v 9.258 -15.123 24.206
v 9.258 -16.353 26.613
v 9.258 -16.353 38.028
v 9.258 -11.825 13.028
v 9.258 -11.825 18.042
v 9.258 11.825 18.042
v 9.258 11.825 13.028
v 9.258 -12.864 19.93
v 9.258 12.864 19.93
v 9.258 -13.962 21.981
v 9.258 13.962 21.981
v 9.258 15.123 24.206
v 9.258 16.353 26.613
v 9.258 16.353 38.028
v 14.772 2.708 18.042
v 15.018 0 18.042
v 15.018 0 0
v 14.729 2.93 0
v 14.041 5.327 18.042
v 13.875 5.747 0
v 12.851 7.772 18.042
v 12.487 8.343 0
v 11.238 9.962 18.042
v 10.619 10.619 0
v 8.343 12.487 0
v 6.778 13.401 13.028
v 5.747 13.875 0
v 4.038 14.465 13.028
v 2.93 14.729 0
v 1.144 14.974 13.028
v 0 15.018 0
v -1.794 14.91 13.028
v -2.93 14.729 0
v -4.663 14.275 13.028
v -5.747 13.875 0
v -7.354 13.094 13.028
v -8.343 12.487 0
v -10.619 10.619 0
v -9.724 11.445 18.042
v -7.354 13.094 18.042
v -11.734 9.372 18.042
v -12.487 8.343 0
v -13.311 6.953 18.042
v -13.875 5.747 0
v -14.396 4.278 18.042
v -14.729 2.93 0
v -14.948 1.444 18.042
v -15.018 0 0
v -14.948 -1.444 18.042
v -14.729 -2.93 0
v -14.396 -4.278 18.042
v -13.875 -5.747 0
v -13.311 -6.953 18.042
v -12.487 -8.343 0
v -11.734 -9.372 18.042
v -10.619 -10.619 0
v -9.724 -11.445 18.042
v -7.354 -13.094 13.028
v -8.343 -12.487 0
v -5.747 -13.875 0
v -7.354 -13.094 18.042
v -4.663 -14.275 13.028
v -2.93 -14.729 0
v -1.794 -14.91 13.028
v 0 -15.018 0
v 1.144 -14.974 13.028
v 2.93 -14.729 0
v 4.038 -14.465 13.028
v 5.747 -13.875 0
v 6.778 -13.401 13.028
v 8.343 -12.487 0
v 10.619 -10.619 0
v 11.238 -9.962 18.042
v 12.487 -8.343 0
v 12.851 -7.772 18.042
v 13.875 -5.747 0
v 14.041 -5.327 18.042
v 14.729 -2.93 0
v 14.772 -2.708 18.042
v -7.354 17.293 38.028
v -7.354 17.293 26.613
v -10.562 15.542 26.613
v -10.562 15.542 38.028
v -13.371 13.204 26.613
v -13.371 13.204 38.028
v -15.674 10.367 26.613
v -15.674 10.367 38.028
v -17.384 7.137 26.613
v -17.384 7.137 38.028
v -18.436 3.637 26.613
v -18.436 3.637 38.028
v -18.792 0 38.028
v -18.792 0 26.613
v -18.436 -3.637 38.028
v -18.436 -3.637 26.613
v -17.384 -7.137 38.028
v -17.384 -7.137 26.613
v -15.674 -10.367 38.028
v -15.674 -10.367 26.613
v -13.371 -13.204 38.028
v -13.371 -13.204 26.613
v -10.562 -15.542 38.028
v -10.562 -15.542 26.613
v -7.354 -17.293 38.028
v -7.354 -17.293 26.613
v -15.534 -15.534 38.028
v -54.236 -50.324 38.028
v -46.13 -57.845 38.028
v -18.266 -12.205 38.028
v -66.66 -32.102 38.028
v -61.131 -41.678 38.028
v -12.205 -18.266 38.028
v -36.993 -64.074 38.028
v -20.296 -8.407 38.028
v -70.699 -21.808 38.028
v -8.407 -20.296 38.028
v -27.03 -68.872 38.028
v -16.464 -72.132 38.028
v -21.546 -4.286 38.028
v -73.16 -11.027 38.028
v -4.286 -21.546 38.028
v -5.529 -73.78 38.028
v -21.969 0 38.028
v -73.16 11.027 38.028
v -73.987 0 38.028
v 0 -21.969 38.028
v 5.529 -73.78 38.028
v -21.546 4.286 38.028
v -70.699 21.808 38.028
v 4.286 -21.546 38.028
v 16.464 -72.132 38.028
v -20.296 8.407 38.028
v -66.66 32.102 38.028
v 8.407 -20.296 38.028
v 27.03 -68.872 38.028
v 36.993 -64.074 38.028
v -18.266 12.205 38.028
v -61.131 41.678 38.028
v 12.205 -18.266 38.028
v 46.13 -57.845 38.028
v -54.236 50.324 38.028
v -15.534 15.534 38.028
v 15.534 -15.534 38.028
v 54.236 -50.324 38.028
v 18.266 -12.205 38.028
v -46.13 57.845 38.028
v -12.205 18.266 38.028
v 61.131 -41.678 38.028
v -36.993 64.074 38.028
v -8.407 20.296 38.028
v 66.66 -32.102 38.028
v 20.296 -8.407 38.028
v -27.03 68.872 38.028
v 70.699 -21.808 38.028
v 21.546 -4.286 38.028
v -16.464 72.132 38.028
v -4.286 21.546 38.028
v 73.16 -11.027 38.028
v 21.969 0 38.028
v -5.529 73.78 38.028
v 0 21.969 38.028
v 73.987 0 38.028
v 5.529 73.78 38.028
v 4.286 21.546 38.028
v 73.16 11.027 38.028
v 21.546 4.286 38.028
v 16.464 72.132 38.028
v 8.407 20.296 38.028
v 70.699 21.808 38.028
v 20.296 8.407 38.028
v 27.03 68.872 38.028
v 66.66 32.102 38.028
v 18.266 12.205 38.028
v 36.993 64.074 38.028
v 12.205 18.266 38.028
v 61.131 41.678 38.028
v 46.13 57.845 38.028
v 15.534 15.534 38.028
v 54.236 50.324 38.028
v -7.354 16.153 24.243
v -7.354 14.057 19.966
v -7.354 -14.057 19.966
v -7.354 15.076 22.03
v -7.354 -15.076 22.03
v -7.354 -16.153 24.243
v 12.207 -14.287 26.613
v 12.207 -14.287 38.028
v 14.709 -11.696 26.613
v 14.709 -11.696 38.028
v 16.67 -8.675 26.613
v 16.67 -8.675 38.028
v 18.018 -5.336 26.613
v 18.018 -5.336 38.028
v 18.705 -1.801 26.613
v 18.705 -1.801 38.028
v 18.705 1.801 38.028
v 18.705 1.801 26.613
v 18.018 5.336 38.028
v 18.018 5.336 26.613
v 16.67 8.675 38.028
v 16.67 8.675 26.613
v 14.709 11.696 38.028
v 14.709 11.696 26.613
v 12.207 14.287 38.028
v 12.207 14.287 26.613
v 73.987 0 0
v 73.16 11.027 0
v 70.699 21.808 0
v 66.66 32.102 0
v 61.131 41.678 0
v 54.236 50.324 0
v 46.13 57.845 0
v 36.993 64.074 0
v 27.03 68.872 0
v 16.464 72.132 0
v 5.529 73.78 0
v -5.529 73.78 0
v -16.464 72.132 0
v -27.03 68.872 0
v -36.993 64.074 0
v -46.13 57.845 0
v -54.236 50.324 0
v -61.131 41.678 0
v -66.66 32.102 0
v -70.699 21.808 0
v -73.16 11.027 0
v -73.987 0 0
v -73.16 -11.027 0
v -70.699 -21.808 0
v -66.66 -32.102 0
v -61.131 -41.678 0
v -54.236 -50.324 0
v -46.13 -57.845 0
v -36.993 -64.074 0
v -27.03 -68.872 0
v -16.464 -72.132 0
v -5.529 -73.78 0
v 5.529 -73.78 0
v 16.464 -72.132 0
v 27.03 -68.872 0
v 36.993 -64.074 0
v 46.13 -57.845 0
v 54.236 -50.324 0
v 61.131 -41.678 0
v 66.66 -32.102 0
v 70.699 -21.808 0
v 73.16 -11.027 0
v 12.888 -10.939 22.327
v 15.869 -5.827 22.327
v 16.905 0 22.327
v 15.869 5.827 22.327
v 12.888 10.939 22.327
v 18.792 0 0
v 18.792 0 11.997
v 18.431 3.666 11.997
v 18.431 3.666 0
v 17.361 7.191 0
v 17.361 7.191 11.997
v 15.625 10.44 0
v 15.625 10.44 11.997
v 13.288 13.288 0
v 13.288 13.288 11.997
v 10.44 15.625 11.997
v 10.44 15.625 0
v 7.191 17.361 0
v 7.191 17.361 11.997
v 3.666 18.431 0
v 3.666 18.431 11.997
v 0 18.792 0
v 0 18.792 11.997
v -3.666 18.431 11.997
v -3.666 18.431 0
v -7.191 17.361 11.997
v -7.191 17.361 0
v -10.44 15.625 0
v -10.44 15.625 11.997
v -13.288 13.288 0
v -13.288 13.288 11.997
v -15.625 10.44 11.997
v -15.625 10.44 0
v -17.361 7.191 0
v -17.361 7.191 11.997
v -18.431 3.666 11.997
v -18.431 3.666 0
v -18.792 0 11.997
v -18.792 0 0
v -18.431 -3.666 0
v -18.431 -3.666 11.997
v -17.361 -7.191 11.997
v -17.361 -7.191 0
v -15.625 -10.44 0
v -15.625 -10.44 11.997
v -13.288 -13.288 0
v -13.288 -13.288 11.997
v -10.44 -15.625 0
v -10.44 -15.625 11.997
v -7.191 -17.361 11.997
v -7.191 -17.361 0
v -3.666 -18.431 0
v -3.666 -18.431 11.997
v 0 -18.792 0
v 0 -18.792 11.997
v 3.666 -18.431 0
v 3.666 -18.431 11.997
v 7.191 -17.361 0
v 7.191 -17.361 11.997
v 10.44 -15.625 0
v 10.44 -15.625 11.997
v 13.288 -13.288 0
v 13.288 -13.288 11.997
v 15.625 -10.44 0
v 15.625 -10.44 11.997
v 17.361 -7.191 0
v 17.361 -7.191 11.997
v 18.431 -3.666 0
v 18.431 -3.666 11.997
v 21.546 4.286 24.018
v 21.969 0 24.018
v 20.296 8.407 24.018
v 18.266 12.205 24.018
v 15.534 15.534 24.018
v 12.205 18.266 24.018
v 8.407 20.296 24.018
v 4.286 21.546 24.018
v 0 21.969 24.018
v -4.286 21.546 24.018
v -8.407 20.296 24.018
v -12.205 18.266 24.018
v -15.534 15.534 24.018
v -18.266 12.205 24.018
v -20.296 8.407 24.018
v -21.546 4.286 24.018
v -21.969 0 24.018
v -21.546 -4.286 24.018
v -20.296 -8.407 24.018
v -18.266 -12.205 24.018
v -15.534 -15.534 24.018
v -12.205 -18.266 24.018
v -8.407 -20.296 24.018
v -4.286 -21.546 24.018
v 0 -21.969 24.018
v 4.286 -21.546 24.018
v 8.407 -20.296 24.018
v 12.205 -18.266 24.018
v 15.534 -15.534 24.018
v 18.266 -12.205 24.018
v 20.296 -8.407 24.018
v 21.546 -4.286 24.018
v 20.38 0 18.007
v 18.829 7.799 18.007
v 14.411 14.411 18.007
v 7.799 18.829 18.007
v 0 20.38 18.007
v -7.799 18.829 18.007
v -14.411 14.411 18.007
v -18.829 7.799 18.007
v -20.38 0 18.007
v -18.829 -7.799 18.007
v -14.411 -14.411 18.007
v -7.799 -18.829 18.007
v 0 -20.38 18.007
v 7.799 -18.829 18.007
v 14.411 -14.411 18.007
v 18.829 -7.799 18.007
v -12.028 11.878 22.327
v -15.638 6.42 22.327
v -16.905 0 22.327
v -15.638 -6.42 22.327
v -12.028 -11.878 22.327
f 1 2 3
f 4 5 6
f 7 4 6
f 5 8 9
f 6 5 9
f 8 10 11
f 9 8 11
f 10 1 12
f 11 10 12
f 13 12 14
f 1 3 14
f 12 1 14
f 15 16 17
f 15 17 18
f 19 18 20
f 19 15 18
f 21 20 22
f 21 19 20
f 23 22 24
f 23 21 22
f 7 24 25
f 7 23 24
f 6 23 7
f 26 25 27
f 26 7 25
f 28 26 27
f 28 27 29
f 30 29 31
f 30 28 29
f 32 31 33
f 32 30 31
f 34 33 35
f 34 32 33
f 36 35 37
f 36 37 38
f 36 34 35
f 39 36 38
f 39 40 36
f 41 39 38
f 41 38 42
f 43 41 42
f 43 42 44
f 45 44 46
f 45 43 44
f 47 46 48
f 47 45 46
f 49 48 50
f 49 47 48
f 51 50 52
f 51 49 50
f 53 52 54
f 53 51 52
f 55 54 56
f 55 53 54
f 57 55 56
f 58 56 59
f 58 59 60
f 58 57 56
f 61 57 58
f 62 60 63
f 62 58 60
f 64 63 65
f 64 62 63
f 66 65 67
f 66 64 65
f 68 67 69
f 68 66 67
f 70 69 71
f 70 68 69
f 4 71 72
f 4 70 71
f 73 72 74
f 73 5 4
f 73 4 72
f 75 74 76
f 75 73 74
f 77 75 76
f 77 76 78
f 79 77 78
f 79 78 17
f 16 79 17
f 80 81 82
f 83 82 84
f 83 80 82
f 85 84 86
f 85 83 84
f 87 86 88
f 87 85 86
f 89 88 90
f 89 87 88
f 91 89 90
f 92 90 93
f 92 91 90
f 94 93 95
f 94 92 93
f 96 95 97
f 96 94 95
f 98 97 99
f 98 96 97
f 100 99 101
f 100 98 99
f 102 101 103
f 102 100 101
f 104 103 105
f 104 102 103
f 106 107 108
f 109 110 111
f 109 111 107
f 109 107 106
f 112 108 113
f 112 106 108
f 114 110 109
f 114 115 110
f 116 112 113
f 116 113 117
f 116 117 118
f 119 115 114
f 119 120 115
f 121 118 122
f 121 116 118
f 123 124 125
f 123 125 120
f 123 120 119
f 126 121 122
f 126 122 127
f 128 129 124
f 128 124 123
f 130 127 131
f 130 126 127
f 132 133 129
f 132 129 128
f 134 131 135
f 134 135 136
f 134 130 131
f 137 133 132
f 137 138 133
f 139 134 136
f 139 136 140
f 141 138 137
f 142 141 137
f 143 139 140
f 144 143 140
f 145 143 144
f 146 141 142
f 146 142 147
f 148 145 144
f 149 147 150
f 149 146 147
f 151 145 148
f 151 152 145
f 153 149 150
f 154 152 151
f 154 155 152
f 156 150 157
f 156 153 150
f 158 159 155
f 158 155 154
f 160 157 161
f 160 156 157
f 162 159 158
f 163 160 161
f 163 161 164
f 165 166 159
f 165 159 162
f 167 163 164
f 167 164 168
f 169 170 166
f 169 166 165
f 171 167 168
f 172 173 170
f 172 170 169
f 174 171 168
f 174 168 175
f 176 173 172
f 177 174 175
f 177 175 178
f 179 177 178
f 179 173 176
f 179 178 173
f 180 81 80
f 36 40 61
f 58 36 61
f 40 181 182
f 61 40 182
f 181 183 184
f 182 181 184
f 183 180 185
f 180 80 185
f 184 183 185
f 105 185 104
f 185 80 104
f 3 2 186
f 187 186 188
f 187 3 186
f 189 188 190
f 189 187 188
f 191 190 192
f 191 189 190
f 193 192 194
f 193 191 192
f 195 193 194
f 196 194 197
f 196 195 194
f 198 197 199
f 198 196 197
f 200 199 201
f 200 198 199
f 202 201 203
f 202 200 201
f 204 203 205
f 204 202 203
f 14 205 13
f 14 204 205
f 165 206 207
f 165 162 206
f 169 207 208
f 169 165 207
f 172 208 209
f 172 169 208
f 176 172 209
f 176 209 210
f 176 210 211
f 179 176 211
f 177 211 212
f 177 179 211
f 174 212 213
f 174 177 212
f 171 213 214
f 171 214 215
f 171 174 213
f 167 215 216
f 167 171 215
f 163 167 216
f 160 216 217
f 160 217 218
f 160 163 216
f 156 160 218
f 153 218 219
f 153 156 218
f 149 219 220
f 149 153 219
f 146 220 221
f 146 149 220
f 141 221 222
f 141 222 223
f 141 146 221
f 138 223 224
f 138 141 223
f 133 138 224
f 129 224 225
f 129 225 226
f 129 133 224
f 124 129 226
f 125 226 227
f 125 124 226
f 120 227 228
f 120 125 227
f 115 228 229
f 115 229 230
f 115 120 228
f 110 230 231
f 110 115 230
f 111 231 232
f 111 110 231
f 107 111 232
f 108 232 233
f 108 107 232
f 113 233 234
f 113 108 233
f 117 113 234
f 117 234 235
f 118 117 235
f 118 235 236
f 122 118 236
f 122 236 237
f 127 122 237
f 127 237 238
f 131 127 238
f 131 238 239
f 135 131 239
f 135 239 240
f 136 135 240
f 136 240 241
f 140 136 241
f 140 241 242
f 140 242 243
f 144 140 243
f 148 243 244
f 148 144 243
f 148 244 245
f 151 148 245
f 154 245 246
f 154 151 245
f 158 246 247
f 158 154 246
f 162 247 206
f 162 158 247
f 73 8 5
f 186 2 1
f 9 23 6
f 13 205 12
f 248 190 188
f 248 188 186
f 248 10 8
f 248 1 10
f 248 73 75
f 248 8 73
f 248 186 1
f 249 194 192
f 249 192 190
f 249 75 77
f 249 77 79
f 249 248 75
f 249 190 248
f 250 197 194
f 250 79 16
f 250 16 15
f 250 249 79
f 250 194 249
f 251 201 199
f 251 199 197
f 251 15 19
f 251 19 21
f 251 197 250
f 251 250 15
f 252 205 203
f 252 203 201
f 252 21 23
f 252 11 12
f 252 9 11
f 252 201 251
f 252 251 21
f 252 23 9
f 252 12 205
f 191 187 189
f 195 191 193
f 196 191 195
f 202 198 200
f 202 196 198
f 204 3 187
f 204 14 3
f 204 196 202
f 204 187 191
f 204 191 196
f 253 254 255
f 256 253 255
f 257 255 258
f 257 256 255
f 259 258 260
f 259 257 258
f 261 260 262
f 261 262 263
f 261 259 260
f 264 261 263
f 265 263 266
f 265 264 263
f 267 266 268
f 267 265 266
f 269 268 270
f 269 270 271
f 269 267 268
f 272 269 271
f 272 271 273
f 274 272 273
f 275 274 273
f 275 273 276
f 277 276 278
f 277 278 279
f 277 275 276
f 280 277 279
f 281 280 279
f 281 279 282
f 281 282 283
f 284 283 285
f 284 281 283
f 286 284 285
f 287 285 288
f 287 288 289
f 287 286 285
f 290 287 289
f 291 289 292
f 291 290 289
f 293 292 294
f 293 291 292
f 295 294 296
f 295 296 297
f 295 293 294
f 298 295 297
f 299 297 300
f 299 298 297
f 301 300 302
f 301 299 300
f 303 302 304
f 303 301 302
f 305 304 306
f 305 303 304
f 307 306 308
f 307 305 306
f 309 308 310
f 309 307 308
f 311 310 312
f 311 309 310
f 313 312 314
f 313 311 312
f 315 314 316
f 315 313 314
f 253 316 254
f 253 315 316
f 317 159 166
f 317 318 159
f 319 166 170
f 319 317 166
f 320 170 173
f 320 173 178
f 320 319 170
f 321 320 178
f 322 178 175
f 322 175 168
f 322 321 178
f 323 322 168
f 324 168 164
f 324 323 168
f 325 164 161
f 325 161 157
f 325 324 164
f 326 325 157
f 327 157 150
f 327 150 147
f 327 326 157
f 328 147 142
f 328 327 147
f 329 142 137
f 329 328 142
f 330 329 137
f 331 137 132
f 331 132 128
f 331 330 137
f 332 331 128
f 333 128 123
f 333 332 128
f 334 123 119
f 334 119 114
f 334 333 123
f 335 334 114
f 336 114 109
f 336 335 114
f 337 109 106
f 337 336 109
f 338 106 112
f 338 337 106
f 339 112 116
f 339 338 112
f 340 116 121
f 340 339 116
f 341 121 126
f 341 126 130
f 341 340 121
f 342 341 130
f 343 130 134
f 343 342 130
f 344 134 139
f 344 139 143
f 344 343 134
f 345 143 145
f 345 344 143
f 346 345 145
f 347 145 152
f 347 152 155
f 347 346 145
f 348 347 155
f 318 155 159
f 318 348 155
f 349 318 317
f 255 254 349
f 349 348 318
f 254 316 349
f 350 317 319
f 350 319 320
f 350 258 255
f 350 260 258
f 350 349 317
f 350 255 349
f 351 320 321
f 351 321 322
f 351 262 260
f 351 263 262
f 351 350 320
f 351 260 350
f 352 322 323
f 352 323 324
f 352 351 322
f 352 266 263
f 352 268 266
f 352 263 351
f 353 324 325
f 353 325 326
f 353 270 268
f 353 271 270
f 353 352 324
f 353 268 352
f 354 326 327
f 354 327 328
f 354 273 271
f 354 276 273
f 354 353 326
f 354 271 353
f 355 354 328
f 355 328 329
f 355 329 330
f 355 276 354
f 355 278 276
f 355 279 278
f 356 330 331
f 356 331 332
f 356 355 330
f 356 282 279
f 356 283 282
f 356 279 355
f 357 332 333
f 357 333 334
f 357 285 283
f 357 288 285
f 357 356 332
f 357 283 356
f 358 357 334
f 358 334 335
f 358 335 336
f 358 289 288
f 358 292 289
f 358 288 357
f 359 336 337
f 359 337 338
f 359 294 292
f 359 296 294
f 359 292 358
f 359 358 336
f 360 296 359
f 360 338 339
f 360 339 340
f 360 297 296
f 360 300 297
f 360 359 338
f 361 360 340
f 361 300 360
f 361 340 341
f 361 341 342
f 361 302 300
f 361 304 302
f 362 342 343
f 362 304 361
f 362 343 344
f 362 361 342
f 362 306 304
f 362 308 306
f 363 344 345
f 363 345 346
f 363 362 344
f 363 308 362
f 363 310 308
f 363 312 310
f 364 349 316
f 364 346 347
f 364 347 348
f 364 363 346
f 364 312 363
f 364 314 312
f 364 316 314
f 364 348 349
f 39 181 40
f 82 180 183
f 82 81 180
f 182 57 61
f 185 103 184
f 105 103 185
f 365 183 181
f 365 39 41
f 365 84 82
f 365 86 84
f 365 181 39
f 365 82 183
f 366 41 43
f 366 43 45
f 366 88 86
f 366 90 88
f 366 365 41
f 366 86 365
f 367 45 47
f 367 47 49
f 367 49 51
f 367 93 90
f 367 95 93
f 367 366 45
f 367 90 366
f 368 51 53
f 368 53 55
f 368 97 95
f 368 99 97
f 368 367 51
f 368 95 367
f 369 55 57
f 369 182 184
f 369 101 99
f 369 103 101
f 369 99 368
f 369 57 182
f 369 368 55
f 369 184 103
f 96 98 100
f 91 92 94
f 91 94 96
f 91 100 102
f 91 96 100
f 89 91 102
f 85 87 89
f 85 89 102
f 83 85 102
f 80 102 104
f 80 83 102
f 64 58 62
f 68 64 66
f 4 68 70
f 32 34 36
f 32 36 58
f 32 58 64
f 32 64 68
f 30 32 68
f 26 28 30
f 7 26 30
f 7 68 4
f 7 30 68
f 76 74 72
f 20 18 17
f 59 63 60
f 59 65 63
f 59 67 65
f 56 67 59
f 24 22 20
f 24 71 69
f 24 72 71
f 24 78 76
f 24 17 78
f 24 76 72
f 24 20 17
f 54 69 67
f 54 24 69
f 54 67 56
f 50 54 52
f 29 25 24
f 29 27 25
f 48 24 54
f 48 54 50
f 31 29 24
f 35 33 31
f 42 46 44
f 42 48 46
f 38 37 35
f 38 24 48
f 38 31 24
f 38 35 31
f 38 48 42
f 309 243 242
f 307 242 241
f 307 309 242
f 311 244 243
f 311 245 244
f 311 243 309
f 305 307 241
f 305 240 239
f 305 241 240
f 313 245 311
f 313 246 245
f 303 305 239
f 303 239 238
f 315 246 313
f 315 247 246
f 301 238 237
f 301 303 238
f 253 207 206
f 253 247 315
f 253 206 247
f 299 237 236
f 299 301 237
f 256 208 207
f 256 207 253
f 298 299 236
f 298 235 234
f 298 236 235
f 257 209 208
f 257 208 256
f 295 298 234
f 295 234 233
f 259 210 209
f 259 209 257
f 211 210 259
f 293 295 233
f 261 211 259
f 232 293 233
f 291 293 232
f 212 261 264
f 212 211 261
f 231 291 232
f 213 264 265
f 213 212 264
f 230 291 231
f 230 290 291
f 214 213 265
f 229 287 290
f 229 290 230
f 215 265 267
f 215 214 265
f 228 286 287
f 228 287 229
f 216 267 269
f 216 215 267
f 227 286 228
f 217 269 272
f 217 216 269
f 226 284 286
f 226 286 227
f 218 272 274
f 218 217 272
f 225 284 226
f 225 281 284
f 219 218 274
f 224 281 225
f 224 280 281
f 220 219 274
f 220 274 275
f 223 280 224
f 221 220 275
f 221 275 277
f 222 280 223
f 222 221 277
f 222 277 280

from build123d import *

# Parameters (mm, degrees)
F3_DEPTH = 25


with BuildPart() as f1:
    # F0 (on Front) → F1 (revolve)
    with BuildSketch(Plane.XZ):
        Polygon((0, 38.028415), (0, 0), (15.017891, 0), (15.017891, 18.041525), (18.79167, 26.612796), (18.79167, 38.028415), align=None)
        Polygon((73.986508, 38.028415), (21.968598, 38.028415), (21.968598, 24.0178), (18.79167, 11.996607), (18.79167, 0), (73.986508, 0), align=None)
    revolve(axis=Axis((0, 0, 19.014208), (0, 0, 1)))

    # F2 (on face) → F3 (cut)
    with BuildSketch(Plane.XY.offset(38.028415)):
        with BuildLine():
            ThreePointArc((9.257966, 16.352888), (1.061574, 18.761661), (-7.35422, 17.29284))
            Line((-7.35422, 17.29284), (-7.35422, -17.29284))
            ThreePointArc((-7.35422, -17.29284), (1.061574, -18.761661), (9.257966, -16.352888))
            Line((9.257966, -16.352888), (9.257966, 16.352888))
        make_face()
    extrude(amount=-F3_DEPTH, mode=Mode.SUBTRACT)


solid = f1.part
